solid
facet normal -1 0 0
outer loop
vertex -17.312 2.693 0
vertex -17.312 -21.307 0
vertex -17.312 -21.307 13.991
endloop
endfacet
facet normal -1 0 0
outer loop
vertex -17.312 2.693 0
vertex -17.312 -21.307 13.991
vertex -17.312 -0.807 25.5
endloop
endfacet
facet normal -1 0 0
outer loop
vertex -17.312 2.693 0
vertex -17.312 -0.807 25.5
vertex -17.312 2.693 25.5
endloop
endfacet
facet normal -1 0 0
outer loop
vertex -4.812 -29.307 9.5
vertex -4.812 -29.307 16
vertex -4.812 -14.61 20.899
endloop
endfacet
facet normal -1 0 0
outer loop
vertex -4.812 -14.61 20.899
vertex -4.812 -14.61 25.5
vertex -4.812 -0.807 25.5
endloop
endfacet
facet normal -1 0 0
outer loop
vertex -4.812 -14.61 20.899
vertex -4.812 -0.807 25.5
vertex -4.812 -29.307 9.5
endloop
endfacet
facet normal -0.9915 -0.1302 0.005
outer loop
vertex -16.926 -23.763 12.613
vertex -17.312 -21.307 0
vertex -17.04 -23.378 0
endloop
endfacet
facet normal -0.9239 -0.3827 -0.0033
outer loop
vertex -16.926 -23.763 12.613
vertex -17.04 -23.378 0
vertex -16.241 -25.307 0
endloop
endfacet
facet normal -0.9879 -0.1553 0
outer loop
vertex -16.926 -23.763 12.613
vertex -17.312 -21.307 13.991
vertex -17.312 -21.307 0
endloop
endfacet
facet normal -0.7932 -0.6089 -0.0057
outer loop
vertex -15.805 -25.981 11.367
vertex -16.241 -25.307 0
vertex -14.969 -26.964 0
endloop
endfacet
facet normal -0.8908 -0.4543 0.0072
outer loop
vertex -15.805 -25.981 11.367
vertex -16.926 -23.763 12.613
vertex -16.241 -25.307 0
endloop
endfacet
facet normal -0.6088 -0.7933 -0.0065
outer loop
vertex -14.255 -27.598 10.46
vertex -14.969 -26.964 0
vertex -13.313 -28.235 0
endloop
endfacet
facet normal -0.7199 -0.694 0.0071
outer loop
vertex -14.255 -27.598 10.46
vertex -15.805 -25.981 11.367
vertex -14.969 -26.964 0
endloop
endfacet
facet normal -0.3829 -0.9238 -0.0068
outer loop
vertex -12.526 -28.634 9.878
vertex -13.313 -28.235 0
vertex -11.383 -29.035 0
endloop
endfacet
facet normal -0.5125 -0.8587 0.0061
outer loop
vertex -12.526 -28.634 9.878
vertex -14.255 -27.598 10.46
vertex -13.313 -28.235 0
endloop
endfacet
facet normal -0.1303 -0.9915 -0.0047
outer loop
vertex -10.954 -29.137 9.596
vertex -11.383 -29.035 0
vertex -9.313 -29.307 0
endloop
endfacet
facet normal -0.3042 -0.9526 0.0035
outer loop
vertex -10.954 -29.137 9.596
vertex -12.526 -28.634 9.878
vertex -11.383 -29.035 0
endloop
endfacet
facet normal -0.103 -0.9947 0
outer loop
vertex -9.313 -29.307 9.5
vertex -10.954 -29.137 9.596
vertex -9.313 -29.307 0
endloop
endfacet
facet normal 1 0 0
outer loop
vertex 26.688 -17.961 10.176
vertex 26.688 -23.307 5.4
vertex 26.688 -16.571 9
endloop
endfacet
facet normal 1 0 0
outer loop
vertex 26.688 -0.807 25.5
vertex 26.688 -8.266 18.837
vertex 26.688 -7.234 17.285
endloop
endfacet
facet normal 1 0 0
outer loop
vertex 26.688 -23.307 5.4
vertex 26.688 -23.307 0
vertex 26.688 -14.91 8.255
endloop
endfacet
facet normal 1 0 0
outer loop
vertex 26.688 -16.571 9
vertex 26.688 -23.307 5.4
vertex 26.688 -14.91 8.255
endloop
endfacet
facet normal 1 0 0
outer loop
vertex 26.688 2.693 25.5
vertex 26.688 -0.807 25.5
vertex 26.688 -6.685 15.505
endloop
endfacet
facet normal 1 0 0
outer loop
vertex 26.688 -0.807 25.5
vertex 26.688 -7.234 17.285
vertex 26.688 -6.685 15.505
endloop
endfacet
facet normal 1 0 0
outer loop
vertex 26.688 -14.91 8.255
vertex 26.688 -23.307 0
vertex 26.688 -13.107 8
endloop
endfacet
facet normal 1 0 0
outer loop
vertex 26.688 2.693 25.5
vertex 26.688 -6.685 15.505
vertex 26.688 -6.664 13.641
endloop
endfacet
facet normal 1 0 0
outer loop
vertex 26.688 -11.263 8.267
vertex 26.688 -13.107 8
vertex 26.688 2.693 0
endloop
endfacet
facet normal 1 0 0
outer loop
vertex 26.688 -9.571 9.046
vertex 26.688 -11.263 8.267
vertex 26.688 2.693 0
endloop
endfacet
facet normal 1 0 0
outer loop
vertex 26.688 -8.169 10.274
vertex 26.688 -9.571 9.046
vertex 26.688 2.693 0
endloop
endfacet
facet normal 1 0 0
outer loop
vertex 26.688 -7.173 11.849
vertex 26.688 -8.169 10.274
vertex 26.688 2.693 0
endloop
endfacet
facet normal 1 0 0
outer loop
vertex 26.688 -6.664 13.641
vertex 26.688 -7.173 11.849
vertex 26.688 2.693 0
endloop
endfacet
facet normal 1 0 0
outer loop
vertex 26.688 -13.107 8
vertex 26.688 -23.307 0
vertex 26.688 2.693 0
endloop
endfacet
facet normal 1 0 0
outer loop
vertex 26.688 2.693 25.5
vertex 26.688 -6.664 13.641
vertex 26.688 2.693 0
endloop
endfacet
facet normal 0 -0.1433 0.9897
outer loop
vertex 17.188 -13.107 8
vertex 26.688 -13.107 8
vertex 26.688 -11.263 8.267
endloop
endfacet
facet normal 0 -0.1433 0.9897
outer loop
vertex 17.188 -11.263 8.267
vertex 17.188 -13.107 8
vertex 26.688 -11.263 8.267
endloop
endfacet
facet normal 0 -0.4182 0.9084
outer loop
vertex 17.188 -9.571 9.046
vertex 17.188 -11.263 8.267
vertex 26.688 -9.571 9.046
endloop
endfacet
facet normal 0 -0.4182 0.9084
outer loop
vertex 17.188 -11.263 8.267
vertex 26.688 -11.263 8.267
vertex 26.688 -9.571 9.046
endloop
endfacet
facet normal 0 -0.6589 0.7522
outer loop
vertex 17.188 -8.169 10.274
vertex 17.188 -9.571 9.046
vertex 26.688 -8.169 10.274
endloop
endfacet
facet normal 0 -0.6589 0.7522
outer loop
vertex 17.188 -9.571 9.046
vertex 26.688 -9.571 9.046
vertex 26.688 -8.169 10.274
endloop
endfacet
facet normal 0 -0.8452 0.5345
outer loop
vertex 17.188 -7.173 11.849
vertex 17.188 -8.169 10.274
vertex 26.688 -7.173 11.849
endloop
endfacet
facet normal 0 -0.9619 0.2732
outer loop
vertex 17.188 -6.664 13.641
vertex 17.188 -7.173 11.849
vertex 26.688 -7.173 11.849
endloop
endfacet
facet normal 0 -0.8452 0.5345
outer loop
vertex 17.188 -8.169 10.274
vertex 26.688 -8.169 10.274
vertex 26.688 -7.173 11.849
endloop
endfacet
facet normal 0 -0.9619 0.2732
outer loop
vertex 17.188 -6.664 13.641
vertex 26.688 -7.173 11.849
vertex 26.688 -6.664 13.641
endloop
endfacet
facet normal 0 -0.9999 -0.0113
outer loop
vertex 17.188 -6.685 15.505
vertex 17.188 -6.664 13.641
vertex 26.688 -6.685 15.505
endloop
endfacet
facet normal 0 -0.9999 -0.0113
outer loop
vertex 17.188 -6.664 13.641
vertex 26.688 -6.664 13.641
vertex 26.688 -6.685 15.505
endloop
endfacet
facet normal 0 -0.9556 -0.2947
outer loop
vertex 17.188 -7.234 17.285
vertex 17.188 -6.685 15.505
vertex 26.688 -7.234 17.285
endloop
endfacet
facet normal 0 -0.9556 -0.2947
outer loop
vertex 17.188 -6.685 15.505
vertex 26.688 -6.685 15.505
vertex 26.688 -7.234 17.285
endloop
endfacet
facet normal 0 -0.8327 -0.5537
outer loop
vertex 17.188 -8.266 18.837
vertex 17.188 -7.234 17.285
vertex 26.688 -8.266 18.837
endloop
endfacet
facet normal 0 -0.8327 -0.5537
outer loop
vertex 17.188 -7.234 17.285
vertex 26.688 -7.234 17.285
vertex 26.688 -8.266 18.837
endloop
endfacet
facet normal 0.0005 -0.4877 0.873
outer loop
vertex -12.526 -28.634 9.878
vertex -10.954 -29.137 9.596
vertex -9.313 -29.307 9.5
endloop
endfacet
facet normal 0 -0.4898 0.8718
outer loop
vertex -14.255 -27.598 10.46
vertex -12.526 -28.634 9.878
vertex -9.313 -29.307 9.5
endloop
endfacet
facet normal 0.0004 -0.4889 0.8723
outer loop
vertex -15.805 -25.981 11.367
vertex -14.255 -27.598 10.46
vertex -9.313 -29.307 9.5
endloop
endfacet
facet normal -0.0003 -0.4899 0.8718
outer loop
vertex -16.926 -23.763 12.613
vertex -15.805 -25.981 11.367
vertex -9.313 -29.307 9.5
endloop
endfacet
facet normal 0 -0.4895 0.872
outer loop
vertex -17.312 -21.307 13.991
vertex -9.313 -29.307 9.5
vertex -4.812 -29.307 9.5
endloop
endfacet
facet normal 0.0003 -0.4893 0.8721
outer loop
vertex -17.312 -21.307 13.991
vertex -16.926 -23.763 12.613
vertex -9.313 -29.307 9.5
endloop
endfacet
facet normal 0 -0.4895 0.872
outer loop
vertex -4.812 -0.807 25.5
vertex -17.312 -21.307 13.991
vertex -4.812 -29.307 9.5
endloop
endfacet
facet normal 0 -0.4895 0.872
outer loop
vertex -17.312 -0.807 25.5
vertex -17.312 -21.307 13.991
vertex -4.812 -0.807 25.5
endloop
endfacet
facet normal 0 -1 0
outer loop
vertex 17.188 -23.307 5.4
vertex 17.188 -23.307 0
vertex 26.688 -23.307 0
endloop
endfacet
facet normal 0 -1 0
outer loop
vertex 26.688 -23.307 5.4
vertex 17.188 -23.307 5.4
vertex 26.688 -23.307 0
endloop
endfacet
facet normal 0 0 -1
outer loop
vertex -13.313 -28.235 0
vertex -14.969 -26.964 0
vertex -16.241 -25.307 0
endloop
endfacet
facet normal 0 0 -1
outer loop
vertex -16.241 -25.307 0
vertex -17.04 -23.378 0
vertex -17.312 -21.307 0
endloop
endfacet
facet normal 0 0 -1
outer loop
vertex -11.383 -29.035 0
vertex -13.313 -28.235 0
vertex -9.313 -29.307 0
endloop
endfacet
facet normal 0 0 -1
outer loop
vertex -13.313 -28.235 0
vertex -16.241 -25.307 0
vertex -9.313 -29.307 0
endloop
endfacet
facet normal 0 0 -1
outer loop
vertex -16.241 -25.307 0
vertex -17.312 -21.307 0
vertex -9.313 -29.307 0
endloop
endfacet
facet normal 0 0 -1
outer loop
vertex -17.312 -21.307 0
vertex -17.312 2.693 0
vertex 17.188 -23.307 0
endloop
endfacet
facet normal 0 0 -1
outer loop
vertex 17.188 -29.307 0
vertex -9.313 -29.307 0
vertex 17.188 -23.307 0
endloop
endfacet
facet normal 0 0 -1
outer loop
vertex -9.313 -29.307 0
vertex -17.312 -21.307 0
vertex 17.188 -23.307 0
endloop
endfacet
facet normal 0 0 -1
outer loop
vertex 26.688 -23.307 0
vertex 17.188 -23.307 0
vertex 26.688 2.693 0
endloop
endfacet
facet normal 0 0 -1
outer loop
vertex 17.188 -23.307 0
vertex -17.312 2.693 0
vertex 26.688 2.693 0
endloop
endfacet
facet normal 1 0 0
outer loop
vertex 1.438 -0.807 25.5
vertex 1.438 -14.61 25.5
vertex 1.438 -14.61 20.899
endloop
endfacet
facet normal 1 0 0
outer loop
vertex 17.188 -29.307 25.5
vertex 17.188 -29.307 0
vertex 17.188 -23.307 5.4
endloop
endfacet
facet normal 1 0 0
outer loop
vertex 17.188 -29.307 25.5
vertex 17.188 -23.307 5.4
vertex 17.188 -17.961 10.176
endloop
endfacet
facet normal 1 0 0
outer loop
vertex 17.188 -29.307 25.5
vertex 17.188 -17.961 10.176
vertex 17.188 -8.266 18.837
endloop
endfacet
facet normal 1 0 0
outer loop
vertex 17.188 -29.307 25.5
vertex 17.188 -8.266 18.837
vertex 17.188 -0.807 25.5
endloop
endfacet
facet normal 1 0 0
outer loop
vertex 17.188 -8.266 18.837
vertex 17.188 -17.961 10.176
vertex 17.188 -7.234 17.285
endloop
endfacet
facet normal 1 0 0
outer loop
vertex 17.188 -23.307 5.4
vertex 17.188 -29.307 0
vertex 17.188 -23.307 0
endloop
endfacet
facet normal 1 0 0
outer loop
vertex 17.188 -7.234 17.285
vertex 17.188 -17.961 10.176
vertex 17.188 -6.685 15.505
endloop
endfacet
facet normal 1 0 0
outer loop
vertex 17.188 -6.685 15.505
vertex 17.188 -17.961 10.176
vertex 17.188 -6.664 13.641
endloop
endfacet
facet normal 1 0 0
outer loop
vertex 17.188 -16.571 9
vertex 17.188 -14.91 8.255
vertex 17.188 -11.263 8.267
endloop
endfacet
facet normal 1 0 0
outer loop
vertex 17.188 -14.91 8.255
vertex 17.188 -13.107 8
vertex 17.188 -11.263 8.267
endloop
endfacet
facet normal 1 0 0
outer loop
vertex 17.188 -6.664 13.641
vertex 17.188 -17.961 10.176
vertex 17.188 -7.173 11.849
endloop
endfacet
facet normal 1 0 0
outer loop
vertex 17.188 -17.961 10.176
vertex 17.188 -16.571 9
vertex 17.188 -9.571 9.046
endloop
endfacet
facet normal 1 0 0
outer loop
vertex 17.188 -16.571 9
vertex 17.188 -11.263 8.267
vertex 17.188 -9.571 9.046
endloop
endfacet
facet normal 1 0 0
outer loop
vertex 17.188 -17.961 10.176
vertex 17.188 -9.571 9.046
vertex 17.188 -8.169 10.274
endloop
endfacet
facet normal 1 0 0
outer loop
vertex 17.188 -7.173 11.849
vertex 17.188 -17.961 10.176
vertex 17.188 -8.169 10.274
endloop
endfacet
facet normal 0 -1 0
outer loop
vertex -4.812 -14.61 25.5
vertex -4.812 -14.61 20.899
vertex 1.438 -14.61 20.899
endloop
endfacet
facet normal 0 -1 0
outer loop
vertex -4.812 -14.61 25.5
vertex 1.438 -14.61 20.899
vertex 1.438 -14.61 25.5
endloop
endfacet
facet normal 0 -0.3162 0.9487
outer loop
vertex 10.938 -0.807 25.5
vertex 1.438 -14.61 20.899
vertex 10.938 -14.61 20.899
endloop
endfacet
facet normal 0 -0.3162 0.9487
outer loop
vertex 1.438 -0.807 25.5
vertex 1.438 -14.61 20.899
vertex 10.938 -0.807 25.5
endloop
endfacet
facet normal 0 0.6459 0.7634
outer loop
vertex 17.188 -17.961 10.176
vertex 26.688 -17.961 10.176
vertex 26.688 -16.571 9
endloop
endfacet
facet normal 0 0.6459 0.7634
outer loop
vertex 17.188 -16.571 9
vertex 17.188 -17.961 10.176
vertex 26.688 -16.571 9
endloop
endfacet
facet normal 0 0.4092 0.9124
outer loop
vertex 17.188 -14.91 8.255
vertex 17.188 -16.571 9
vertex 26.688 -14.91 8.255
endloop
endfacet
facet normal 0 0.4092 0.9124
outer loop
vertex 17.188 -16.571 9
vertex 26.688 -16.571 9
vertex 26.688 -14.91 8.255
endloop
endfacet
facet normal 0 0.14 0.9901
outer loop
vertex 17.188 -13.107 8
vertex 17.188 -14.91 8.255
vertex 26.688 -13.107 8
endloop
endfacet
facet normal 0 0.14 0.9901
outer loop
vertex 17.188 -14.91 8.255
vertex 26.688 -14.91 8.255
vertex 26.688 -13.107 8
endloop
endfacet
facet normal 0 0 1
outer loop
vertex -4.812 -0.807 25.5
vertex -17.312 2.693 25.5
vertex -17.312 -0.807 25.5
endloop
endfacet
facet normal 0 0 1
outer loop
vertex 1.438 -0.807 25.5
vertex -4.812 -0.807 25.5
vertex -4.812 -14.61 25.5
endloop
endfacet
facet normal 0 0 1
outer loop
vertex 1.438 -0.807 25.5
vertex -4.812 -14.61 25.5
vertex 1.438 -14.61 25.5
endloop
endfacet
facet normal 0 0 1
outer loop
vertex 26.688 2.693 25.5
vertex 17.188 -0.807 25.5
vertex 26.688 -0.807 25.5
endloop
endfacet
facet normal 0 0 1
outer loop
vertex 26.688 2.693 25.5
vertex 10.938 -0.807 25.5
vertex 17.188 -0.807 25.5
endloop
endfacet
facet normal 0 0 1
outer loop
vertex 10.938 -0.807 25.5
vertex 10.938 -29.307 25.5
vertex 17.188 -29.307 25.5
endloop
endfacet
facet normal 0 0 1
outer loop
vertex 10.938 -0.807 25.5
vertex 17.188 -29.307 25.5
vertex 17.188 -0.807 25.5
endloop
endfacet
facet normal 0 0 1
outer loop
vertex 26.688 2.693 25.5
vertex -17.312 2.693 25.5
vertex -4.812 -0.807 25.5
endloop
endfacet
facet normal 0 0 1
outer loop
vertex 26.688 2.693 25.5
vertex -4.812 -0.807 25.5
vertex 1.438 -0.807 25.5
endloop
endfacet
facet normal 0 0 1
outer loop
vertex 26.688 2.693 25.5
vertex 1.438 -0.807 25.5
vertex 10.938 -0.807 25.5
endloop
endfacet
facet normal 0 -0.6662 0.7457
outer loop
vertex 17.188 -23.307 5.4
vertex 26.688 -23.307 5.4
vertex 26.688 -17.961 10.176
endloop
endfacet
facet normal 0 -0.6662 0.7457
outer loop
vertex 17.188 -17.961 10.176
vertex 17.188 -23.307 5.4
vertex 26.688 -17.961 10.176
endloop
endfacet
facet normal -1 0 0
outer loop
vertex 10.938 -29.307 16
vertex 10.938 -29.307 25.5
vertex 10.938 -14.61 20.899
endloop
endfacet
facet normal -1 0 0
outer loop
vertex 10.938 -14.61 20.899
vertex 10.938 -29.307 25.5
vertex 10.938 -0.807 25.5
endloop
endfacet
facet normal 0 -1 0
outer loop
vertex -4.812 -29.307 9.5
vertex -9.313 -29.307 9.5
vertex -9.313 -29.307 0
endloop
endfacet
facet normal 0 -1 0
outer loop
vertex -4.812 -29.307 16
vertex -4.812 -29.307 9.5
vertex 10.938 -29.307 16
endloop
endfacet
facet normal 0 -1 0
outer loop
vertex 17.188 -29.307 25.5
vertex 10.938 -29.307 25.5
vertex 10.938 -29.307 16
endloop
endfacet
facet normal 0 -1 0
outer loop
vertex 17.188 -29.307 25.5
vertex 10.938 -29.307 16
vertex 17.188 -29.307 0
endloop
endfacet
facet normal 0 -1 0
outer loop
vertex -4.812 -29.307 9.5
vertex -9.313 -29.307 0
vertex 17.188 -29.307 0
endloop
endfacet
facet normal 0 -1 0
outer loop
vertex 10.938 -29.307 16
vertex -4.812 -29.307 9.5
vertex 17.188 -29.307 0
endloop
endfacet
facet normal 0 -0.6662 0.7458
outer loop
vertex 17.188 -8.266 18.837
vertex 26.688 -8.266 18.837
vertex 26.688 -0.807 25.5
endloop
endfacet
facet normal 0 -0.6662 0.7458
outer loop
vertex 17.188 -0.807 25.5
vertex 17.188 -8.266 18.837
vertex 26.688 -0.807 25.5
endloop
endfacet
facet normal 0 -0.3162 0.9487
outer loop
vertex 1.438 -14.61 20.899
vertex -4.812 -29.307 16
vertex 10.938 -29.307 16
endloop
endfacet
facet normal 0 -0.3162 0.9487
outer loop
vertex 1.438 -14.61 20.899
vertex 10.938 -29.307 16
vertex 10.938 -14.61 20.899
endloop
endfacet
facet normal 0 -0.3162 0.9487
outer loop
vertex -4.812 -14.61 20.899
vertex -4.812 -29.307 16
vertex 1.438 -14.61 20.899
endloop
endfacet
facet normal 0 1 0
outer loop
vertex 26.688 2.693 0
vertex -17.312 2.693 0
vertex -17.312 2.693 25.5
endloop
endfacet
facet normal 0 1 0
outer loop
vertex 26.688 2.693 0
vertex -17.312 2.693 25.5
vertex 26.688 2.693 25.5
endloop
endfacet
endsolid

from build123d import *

# Parameters (mm, degrees)
SKETCH1_W            = 22
SKETCH1_H            = 32
BOSS_EXTRUDE1_DEPTH  = 25.5
CUT_EXTRUDE1_START   = -4.8125
CUT_EXTRUDE1_DEPTH   = 15.75
CUT_EXTRUDE1_START_2 = 1.4375
CUT_EXTRUDE1_2_DEPTH = 9.5
SKETCH8_W            = 9.5
SKETCH8_H            = 26
BOSS_EXTRUDE2_DEPTH  = 25.5
CUT_EXTRUDE2_DEPTH   = 9.5
SKETCH10_W           = 12.5
SKETCH10_H           = 32
BOSS_EXTRUDE3_DEPTH  = 25.5
CUT_EXTRUDE3_START   = -17.3125
CUT_EXTRUDE3_DEPTH   = 12.5
FILLET1_R            = 8


# Read off the part's stored shape, not the designer's step: Cut-Extrude1, Cut-Extrude3
with BuildPart() as part:
    # Sketch1 → Boss-Extrude1 (new body)
    with BuildSketch(Plane.XY):
        with Locations((6.1875, -13.307291667)):
            Rectangle(SKETCH1_W, SKETCH1_H)
    extrude(amount=BOSS_EXTRUDE1_DEPTH)

    # Cut-Extrude1 outline → Cut-Extrude1 (cut)
    with BuildSketch(Plane.YZ.offset(CUT_EXTRUDE1_START)):
        Polygon((-29.307291667, 25.5), (-29.307291667, 16), (-14.609886779, 20.899134963), (-14.609886779, 25.5), align=None)
    extrude(amount=CUT_EXTRUDE1_DEPTH, mode=Mode.SUBTRACT)

    # Cut-Extrude1 2 outline → Cut-Extrude1 2 (cut)
    with BuildSketch(Plane.YZ.offset(CUT_EXTRUDE1_START_2)):
        Polygon((-14.609886779, 25.5), (-14.609886779, 20.899134963), (-0.807291667, 25.5), align=None)
    extrude(amount=CUT_EXTRUDE1_2_DEPTH, mode=Mode.SUBTRACT)

    # Sketch8 → Boss-Extrude2 (add)
    with BuildSketch(Plane.XY):
        with Locations((21.9375, -10.307291667)):
            Rectangle(SKETCH8_W, SKETCH8_H)
    extrude(amount=BOSS_EXTRUDE2_DEPTH)

    # Sketch9 → Cut-Extrude2 (cut)
    with BuildSketch(Plane(origin=(26.6875, 0, 0), x_dir=(0, 0, -1), z_dir=(1, 0, 0))):
        with BuildLine():
            Line((-18.837056558, -8.265810445), (-25.5, -0.807291667))
            Line((-25.5, -0.807291667), (-25.5, -23.307291667))
            Line((-25.5, -23.307291667), (-5.4, -23.307291667))
            Line((-5.4, -23.307291667), (-10.176291277, -17.960696954))
            ThreePointArc((-10.176291277, -17.960696954), (-19.347447848, -17.437678411), (-18.837056558, -8.265810445))
        make_face()
        with BuildLine():
            ThreePointArc((-8, -13.107291667), (-11.848667092, -7.172611068), (-18.837056558, -8.265810445))
            Line((-18.837056558, -8.265810445), (-10.176291277, -17.960696954))
            ThreePointArc((-10.176291277, -17.960696954), (-8.568975354, -15.76679287), (-8, -13.107291667))
        make_face()
        with BuildLine():
            Line((-10.176291277, -17.960696954), (-18.837056558, -8.265810445))
            ThreePointArc((-18.837056558, -8.265810445), (-19.347447848, -17.437678411), (-10.176291277, -17.960696954))
        make_face()
    extrude(amount=-CUT_EXTRUDE2_DEPTH, mode=Mode.SUBTRACT)

    # Sketch10 → Boss-Extrude3 (add)
    with BuildSketch(Plane.XY):
        with Locations((-11.0625, -13.307291667)):
            Rectangle(SKETCH10_W, SKETCH10_H)
    extrude(amount=BOSS_EXTRUDE3_DEPTH)

    # Cut-Extrude3 outline → Cut-Extrude3 (cut)
    with BuildSketch(Plane.YZ.offset(CUT_EXTRUDE3_START)):
        Polygon((-29.307291667, 9.5), (-0.807291667, 25.5), (-29.307291667, 25.5), align=None)
    extrude(amount=CUT_EXTRUDE3_DEPTH, mode=Mode.SUBTRACT)

    # Fillet1
    fillet1_edges = [part.edges().sort_by_distance(p)[0] for p in [
        (-17.3125, -29.307291667, 4.75),
    ]]
    fillet(fillet1_edges, radius=FILLET1_R)


solid = part.part
